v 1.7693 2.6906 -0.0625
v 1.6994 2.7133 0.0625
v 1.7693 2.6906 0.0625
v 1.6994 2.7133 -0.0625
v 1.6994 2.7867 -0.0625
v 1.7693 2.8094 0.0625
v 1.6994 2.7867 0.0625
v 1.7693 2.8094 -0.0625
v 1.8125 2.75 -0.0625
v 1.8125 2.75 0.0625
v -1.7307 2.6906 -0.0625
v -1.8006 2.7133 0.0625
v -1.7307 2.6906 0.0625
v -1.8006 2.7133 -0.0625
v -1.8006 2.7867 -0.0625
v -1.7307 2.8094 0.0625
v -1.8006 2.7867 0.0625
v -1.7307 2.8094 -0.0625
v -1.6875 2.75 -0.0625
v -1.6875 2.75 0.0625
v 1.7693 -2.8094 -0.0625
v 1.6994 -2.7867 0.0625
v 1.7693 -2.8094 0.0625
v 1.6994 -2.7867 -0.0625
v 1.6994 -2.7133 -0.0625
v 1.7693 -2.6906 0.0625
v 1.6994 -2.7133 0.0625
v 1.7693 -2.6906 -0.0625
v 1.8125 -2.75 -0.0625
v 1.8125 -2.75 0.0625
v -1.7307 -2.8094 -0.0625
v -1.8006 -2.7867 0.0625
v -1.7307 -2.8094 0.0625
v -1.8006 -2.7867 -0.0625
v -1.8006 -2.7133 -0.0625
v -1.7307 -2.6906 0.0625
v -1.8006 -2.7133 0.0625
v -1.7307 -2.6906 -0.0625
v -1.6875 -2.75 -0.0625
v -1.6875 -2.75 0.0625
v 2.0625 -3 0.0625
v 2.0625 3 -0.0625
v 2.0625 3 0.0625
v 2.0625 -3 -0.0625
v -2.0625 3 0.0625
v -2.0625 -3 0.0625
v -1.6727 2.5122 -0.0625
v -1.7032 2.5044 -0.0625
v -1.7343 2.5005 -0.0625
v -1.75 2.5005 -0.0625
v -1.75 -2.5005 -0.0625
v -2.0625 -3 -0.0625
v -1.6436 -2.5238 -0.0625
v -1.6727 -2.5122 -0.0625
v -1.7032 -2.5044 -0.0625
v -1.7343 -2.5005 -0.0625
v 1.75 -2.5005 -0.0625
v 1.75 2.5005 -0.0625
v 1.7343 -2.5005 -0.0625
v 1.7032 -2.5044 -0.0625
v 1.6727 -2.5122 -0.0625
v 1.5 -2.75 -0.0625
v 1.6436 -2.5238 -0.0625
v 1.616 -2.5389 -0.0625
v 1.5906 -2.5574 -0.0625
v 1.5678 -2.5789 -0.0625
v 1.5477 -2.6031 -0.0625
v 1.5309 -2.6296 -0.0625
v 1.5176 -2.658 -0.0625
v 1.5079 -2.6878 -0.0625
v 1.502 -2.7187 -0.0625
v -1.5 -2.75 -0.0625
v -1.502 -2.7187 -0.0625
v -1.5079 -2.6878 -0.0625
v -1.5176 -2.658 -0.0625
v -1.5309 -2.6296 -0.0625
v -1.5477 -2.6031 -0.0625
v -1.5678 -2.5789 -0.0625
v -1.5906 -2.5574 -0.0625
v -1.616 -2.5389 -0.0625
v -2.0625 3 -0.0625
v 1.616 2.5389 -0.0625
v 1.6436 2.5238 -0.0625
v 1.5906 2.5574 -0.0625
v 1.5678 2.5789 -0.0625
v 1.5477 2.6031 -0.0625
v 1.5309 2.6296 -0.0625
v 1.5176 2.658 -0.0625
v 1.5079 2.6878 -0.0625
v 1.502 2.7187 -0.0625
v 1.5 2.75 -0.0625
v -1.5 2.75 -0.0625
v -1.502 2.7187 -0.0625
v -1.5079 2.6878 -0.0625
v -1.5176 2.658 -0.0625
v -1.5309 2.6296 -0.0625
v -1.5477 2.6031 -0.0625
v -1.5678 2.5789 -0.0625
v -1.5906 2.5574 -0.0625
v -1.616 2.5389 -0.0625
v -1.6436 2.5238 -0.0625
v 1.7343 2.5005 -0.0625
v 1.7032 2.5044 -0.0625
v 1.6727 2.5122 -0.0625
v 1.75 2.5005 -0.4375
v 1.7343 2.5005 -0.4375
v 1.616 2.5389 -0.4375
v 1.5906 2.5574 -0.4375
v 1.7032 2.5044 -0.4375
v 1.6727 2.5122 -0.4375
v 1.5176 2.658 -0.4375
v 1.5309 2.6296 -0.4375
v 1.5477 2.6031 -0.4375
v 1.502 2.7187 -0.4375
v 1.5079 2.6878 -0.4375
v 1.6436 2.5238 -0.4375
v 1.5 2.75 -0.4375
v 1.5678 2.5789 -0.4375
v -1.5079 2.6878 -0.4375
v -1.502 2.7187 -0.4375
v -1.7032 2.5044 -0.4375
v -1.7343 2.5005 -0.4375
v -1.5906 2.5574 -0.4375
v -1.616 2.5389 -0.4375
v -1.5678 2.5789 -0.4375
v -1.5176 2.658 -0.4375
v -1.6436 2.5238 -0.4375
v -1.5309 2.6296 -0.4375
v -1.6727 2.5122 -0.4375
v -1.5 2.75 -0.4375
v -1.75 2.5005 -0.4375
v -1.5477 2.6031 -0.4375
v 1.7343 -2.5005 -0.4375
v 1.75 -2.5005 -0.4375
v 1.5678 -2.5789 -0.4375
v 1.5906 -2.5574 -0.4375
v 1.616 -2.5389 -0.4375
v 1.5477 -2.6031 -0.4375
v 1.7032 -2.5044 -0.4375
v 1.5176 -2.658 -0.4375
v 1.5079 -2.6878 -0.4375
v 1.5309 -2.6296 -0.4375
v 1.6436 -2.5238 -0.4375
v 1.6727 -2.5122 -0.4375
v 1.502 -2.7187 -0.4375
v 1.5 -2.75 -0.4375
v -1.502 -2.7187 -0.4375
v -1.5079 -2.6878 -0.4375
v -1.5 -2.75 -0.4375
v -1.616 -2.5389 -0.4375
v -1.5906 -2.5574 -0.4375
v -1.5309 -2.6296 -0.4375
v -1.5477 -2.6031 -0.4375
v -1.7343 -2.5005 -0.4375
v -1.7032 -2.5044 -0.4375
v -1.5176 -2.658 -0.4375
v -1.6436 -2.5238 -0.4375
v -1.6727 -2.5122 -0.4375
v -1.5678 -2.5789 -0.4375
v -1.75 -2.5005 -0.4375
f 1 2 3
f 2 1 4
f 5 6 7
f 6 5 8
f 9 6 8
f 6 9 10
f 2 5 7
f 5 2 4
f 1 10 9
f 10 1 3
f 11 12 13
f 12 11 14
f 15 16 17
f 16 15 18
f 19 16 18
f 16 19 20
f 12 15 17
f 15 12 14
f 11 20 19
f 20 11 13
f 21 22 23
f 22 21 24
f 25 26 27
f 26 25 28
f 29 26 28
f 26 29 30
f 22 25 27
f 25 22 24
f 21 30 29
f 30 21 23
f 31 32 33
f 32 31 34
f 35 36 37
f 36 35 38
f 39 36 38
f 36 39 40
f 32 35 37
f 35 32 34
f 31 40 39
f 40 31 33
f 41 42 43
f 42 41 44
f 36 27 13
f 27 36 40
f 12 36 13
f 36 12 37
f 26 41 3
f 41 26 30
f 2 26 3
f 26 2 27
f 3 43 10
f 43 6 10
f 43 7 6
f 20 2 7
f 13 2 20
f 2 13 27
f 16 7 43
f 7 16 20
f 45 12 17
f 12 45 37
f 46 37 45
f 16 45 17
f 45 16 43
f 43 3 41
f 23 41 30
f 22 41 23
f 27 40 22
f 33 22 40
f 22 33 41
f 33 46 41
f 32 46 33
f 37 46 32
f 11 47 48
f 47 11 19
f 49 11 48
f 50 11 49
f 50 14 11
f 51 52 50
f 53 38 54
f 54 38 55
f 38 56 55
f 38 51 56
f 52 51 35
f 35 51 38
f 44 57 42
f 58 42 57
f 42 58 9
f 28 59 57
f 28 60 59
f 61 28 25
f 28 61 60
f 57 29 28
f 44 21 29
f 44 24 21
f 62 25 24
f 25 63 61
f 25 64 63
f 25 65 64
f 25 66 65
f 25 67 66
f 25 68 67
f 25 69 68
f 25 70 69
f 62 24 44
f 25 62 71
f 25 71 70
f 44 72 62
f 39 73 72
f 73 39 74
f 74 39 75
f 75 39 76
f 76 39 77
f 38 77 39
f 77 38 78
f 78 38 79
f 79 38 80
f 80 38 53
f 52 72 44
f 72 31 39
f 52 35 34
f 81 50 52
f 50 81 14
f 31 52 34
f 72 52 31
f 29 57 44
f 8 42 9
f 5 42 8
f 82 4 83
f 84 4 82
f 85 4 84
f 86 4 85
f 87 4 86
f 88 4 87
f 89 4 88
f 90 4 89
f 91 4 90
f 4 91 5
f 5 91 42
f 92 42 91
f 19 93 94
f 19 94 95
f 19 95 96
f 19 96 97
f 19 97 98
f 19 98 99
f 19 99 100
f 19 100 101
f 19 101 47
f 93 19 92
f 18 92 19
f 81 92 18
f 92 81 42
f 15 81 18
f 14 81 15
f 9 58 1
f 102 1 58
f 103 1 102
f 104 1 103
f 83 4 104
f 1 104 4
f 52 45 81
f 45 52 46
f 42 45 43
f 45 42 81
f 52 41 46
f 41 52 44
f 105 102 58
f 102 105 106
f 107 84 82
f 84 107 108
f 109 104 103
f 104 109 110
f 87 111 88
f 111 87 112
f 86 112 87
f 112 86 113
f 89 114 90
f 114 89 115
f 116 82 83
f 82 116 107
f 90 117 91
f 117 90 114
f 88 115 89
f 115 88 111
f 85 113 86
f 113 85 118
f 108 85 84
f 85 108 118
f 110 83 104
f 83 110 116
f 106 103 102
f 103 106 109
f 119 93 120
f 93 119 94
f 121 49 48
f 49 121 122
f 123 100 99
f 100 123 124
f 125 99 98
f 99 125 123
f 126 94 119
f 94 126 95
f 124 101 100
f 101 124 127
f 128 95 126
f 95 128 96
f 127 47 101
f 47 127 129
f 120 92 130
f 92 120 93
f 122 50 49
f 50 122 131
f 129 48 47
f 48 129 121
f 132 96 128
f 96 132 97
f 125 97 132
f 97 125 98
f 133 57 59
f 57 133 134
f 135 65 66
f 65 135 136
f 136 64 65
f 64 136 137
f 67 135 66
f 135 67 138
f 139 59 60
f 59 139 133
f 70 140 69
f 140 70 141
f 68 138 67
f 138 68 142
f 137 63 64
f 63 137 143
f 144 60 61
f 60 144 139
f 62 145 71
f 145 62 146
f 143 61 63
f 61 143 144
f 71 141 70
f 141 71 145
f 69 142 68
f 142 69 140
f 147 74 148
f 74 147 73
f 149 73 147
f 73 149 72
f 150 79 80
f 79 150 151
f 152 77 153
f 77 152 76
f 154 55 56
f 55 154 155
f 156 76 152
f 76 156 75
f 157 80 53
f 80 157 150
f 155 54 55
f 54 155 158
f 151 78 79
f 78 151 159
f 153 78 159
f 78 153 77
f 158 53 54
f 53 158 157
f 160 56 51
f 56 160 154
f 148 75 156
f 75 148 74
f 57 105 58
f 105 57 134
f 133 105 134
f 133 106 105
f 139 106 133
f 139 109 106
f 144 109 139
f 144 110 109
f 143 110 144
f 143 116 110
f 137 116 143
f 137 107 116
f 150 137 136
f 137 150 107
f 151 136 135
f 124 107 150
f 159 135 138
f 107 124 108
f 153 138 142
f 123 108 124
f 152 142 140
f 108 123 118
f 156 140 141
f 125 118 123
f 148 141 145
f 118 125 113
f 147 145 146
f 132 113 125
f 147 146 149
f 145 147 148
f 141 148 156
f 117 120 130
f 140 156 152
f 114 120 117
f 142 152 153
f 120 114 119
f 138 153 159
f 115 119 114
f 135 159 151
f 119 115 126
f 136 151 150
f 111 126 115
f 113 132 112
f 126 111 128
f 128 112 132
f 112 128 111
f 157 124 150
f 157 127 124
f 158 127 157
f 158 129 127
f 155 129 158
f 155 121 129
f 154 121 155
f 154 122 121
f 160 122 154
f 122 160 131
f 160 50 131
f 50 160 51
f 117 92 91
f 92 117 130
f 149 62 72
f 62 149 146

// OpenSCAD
//project box with louvers
//cylinder posts on the sides
$fa =1;
$fs =0.1;
fz = 0.25;
w_box =4;
l_box =6;
h_box =4;
t_box = .125;//thickness
c_size = .25;//post radius
l_angle = 25;//angle of louver from vertical
l_width = .25;//width of each louver
l_num = 8;//number of louvers
posts = [[1,1],[-1,1],[1,-1],[-1,-1]];
//top of the box
difference() {
cube([w_box+t_box,l_box,t_box], center = true);
for (i = [0:3]){
translate ([(posts[i][0]*w_box/2)-posts[i][0]*fz,(posts[i][1]*l_box/2)-posts[i][1]*fz,t_box])
    cylinder(h = t_box+fz*2.1,r = 0.0625,center=true);
    }
}
//inset box
translate([0,0,-2*t_box])
difference(){
cube([w_box-.5,l_box-.5,t_box+fz], center = true);
//cylinder posts
for (i = [0:3]){
translate ([(posts[i][0]*w_box/2)-posts[i][0]*fz,(posts[i][1]*l_box/2)-posts[i][1]*fz,t_box])
    cylinder(h = t_box+fz*2.1,r = c_size,center=true,$fn=50);
    }}
